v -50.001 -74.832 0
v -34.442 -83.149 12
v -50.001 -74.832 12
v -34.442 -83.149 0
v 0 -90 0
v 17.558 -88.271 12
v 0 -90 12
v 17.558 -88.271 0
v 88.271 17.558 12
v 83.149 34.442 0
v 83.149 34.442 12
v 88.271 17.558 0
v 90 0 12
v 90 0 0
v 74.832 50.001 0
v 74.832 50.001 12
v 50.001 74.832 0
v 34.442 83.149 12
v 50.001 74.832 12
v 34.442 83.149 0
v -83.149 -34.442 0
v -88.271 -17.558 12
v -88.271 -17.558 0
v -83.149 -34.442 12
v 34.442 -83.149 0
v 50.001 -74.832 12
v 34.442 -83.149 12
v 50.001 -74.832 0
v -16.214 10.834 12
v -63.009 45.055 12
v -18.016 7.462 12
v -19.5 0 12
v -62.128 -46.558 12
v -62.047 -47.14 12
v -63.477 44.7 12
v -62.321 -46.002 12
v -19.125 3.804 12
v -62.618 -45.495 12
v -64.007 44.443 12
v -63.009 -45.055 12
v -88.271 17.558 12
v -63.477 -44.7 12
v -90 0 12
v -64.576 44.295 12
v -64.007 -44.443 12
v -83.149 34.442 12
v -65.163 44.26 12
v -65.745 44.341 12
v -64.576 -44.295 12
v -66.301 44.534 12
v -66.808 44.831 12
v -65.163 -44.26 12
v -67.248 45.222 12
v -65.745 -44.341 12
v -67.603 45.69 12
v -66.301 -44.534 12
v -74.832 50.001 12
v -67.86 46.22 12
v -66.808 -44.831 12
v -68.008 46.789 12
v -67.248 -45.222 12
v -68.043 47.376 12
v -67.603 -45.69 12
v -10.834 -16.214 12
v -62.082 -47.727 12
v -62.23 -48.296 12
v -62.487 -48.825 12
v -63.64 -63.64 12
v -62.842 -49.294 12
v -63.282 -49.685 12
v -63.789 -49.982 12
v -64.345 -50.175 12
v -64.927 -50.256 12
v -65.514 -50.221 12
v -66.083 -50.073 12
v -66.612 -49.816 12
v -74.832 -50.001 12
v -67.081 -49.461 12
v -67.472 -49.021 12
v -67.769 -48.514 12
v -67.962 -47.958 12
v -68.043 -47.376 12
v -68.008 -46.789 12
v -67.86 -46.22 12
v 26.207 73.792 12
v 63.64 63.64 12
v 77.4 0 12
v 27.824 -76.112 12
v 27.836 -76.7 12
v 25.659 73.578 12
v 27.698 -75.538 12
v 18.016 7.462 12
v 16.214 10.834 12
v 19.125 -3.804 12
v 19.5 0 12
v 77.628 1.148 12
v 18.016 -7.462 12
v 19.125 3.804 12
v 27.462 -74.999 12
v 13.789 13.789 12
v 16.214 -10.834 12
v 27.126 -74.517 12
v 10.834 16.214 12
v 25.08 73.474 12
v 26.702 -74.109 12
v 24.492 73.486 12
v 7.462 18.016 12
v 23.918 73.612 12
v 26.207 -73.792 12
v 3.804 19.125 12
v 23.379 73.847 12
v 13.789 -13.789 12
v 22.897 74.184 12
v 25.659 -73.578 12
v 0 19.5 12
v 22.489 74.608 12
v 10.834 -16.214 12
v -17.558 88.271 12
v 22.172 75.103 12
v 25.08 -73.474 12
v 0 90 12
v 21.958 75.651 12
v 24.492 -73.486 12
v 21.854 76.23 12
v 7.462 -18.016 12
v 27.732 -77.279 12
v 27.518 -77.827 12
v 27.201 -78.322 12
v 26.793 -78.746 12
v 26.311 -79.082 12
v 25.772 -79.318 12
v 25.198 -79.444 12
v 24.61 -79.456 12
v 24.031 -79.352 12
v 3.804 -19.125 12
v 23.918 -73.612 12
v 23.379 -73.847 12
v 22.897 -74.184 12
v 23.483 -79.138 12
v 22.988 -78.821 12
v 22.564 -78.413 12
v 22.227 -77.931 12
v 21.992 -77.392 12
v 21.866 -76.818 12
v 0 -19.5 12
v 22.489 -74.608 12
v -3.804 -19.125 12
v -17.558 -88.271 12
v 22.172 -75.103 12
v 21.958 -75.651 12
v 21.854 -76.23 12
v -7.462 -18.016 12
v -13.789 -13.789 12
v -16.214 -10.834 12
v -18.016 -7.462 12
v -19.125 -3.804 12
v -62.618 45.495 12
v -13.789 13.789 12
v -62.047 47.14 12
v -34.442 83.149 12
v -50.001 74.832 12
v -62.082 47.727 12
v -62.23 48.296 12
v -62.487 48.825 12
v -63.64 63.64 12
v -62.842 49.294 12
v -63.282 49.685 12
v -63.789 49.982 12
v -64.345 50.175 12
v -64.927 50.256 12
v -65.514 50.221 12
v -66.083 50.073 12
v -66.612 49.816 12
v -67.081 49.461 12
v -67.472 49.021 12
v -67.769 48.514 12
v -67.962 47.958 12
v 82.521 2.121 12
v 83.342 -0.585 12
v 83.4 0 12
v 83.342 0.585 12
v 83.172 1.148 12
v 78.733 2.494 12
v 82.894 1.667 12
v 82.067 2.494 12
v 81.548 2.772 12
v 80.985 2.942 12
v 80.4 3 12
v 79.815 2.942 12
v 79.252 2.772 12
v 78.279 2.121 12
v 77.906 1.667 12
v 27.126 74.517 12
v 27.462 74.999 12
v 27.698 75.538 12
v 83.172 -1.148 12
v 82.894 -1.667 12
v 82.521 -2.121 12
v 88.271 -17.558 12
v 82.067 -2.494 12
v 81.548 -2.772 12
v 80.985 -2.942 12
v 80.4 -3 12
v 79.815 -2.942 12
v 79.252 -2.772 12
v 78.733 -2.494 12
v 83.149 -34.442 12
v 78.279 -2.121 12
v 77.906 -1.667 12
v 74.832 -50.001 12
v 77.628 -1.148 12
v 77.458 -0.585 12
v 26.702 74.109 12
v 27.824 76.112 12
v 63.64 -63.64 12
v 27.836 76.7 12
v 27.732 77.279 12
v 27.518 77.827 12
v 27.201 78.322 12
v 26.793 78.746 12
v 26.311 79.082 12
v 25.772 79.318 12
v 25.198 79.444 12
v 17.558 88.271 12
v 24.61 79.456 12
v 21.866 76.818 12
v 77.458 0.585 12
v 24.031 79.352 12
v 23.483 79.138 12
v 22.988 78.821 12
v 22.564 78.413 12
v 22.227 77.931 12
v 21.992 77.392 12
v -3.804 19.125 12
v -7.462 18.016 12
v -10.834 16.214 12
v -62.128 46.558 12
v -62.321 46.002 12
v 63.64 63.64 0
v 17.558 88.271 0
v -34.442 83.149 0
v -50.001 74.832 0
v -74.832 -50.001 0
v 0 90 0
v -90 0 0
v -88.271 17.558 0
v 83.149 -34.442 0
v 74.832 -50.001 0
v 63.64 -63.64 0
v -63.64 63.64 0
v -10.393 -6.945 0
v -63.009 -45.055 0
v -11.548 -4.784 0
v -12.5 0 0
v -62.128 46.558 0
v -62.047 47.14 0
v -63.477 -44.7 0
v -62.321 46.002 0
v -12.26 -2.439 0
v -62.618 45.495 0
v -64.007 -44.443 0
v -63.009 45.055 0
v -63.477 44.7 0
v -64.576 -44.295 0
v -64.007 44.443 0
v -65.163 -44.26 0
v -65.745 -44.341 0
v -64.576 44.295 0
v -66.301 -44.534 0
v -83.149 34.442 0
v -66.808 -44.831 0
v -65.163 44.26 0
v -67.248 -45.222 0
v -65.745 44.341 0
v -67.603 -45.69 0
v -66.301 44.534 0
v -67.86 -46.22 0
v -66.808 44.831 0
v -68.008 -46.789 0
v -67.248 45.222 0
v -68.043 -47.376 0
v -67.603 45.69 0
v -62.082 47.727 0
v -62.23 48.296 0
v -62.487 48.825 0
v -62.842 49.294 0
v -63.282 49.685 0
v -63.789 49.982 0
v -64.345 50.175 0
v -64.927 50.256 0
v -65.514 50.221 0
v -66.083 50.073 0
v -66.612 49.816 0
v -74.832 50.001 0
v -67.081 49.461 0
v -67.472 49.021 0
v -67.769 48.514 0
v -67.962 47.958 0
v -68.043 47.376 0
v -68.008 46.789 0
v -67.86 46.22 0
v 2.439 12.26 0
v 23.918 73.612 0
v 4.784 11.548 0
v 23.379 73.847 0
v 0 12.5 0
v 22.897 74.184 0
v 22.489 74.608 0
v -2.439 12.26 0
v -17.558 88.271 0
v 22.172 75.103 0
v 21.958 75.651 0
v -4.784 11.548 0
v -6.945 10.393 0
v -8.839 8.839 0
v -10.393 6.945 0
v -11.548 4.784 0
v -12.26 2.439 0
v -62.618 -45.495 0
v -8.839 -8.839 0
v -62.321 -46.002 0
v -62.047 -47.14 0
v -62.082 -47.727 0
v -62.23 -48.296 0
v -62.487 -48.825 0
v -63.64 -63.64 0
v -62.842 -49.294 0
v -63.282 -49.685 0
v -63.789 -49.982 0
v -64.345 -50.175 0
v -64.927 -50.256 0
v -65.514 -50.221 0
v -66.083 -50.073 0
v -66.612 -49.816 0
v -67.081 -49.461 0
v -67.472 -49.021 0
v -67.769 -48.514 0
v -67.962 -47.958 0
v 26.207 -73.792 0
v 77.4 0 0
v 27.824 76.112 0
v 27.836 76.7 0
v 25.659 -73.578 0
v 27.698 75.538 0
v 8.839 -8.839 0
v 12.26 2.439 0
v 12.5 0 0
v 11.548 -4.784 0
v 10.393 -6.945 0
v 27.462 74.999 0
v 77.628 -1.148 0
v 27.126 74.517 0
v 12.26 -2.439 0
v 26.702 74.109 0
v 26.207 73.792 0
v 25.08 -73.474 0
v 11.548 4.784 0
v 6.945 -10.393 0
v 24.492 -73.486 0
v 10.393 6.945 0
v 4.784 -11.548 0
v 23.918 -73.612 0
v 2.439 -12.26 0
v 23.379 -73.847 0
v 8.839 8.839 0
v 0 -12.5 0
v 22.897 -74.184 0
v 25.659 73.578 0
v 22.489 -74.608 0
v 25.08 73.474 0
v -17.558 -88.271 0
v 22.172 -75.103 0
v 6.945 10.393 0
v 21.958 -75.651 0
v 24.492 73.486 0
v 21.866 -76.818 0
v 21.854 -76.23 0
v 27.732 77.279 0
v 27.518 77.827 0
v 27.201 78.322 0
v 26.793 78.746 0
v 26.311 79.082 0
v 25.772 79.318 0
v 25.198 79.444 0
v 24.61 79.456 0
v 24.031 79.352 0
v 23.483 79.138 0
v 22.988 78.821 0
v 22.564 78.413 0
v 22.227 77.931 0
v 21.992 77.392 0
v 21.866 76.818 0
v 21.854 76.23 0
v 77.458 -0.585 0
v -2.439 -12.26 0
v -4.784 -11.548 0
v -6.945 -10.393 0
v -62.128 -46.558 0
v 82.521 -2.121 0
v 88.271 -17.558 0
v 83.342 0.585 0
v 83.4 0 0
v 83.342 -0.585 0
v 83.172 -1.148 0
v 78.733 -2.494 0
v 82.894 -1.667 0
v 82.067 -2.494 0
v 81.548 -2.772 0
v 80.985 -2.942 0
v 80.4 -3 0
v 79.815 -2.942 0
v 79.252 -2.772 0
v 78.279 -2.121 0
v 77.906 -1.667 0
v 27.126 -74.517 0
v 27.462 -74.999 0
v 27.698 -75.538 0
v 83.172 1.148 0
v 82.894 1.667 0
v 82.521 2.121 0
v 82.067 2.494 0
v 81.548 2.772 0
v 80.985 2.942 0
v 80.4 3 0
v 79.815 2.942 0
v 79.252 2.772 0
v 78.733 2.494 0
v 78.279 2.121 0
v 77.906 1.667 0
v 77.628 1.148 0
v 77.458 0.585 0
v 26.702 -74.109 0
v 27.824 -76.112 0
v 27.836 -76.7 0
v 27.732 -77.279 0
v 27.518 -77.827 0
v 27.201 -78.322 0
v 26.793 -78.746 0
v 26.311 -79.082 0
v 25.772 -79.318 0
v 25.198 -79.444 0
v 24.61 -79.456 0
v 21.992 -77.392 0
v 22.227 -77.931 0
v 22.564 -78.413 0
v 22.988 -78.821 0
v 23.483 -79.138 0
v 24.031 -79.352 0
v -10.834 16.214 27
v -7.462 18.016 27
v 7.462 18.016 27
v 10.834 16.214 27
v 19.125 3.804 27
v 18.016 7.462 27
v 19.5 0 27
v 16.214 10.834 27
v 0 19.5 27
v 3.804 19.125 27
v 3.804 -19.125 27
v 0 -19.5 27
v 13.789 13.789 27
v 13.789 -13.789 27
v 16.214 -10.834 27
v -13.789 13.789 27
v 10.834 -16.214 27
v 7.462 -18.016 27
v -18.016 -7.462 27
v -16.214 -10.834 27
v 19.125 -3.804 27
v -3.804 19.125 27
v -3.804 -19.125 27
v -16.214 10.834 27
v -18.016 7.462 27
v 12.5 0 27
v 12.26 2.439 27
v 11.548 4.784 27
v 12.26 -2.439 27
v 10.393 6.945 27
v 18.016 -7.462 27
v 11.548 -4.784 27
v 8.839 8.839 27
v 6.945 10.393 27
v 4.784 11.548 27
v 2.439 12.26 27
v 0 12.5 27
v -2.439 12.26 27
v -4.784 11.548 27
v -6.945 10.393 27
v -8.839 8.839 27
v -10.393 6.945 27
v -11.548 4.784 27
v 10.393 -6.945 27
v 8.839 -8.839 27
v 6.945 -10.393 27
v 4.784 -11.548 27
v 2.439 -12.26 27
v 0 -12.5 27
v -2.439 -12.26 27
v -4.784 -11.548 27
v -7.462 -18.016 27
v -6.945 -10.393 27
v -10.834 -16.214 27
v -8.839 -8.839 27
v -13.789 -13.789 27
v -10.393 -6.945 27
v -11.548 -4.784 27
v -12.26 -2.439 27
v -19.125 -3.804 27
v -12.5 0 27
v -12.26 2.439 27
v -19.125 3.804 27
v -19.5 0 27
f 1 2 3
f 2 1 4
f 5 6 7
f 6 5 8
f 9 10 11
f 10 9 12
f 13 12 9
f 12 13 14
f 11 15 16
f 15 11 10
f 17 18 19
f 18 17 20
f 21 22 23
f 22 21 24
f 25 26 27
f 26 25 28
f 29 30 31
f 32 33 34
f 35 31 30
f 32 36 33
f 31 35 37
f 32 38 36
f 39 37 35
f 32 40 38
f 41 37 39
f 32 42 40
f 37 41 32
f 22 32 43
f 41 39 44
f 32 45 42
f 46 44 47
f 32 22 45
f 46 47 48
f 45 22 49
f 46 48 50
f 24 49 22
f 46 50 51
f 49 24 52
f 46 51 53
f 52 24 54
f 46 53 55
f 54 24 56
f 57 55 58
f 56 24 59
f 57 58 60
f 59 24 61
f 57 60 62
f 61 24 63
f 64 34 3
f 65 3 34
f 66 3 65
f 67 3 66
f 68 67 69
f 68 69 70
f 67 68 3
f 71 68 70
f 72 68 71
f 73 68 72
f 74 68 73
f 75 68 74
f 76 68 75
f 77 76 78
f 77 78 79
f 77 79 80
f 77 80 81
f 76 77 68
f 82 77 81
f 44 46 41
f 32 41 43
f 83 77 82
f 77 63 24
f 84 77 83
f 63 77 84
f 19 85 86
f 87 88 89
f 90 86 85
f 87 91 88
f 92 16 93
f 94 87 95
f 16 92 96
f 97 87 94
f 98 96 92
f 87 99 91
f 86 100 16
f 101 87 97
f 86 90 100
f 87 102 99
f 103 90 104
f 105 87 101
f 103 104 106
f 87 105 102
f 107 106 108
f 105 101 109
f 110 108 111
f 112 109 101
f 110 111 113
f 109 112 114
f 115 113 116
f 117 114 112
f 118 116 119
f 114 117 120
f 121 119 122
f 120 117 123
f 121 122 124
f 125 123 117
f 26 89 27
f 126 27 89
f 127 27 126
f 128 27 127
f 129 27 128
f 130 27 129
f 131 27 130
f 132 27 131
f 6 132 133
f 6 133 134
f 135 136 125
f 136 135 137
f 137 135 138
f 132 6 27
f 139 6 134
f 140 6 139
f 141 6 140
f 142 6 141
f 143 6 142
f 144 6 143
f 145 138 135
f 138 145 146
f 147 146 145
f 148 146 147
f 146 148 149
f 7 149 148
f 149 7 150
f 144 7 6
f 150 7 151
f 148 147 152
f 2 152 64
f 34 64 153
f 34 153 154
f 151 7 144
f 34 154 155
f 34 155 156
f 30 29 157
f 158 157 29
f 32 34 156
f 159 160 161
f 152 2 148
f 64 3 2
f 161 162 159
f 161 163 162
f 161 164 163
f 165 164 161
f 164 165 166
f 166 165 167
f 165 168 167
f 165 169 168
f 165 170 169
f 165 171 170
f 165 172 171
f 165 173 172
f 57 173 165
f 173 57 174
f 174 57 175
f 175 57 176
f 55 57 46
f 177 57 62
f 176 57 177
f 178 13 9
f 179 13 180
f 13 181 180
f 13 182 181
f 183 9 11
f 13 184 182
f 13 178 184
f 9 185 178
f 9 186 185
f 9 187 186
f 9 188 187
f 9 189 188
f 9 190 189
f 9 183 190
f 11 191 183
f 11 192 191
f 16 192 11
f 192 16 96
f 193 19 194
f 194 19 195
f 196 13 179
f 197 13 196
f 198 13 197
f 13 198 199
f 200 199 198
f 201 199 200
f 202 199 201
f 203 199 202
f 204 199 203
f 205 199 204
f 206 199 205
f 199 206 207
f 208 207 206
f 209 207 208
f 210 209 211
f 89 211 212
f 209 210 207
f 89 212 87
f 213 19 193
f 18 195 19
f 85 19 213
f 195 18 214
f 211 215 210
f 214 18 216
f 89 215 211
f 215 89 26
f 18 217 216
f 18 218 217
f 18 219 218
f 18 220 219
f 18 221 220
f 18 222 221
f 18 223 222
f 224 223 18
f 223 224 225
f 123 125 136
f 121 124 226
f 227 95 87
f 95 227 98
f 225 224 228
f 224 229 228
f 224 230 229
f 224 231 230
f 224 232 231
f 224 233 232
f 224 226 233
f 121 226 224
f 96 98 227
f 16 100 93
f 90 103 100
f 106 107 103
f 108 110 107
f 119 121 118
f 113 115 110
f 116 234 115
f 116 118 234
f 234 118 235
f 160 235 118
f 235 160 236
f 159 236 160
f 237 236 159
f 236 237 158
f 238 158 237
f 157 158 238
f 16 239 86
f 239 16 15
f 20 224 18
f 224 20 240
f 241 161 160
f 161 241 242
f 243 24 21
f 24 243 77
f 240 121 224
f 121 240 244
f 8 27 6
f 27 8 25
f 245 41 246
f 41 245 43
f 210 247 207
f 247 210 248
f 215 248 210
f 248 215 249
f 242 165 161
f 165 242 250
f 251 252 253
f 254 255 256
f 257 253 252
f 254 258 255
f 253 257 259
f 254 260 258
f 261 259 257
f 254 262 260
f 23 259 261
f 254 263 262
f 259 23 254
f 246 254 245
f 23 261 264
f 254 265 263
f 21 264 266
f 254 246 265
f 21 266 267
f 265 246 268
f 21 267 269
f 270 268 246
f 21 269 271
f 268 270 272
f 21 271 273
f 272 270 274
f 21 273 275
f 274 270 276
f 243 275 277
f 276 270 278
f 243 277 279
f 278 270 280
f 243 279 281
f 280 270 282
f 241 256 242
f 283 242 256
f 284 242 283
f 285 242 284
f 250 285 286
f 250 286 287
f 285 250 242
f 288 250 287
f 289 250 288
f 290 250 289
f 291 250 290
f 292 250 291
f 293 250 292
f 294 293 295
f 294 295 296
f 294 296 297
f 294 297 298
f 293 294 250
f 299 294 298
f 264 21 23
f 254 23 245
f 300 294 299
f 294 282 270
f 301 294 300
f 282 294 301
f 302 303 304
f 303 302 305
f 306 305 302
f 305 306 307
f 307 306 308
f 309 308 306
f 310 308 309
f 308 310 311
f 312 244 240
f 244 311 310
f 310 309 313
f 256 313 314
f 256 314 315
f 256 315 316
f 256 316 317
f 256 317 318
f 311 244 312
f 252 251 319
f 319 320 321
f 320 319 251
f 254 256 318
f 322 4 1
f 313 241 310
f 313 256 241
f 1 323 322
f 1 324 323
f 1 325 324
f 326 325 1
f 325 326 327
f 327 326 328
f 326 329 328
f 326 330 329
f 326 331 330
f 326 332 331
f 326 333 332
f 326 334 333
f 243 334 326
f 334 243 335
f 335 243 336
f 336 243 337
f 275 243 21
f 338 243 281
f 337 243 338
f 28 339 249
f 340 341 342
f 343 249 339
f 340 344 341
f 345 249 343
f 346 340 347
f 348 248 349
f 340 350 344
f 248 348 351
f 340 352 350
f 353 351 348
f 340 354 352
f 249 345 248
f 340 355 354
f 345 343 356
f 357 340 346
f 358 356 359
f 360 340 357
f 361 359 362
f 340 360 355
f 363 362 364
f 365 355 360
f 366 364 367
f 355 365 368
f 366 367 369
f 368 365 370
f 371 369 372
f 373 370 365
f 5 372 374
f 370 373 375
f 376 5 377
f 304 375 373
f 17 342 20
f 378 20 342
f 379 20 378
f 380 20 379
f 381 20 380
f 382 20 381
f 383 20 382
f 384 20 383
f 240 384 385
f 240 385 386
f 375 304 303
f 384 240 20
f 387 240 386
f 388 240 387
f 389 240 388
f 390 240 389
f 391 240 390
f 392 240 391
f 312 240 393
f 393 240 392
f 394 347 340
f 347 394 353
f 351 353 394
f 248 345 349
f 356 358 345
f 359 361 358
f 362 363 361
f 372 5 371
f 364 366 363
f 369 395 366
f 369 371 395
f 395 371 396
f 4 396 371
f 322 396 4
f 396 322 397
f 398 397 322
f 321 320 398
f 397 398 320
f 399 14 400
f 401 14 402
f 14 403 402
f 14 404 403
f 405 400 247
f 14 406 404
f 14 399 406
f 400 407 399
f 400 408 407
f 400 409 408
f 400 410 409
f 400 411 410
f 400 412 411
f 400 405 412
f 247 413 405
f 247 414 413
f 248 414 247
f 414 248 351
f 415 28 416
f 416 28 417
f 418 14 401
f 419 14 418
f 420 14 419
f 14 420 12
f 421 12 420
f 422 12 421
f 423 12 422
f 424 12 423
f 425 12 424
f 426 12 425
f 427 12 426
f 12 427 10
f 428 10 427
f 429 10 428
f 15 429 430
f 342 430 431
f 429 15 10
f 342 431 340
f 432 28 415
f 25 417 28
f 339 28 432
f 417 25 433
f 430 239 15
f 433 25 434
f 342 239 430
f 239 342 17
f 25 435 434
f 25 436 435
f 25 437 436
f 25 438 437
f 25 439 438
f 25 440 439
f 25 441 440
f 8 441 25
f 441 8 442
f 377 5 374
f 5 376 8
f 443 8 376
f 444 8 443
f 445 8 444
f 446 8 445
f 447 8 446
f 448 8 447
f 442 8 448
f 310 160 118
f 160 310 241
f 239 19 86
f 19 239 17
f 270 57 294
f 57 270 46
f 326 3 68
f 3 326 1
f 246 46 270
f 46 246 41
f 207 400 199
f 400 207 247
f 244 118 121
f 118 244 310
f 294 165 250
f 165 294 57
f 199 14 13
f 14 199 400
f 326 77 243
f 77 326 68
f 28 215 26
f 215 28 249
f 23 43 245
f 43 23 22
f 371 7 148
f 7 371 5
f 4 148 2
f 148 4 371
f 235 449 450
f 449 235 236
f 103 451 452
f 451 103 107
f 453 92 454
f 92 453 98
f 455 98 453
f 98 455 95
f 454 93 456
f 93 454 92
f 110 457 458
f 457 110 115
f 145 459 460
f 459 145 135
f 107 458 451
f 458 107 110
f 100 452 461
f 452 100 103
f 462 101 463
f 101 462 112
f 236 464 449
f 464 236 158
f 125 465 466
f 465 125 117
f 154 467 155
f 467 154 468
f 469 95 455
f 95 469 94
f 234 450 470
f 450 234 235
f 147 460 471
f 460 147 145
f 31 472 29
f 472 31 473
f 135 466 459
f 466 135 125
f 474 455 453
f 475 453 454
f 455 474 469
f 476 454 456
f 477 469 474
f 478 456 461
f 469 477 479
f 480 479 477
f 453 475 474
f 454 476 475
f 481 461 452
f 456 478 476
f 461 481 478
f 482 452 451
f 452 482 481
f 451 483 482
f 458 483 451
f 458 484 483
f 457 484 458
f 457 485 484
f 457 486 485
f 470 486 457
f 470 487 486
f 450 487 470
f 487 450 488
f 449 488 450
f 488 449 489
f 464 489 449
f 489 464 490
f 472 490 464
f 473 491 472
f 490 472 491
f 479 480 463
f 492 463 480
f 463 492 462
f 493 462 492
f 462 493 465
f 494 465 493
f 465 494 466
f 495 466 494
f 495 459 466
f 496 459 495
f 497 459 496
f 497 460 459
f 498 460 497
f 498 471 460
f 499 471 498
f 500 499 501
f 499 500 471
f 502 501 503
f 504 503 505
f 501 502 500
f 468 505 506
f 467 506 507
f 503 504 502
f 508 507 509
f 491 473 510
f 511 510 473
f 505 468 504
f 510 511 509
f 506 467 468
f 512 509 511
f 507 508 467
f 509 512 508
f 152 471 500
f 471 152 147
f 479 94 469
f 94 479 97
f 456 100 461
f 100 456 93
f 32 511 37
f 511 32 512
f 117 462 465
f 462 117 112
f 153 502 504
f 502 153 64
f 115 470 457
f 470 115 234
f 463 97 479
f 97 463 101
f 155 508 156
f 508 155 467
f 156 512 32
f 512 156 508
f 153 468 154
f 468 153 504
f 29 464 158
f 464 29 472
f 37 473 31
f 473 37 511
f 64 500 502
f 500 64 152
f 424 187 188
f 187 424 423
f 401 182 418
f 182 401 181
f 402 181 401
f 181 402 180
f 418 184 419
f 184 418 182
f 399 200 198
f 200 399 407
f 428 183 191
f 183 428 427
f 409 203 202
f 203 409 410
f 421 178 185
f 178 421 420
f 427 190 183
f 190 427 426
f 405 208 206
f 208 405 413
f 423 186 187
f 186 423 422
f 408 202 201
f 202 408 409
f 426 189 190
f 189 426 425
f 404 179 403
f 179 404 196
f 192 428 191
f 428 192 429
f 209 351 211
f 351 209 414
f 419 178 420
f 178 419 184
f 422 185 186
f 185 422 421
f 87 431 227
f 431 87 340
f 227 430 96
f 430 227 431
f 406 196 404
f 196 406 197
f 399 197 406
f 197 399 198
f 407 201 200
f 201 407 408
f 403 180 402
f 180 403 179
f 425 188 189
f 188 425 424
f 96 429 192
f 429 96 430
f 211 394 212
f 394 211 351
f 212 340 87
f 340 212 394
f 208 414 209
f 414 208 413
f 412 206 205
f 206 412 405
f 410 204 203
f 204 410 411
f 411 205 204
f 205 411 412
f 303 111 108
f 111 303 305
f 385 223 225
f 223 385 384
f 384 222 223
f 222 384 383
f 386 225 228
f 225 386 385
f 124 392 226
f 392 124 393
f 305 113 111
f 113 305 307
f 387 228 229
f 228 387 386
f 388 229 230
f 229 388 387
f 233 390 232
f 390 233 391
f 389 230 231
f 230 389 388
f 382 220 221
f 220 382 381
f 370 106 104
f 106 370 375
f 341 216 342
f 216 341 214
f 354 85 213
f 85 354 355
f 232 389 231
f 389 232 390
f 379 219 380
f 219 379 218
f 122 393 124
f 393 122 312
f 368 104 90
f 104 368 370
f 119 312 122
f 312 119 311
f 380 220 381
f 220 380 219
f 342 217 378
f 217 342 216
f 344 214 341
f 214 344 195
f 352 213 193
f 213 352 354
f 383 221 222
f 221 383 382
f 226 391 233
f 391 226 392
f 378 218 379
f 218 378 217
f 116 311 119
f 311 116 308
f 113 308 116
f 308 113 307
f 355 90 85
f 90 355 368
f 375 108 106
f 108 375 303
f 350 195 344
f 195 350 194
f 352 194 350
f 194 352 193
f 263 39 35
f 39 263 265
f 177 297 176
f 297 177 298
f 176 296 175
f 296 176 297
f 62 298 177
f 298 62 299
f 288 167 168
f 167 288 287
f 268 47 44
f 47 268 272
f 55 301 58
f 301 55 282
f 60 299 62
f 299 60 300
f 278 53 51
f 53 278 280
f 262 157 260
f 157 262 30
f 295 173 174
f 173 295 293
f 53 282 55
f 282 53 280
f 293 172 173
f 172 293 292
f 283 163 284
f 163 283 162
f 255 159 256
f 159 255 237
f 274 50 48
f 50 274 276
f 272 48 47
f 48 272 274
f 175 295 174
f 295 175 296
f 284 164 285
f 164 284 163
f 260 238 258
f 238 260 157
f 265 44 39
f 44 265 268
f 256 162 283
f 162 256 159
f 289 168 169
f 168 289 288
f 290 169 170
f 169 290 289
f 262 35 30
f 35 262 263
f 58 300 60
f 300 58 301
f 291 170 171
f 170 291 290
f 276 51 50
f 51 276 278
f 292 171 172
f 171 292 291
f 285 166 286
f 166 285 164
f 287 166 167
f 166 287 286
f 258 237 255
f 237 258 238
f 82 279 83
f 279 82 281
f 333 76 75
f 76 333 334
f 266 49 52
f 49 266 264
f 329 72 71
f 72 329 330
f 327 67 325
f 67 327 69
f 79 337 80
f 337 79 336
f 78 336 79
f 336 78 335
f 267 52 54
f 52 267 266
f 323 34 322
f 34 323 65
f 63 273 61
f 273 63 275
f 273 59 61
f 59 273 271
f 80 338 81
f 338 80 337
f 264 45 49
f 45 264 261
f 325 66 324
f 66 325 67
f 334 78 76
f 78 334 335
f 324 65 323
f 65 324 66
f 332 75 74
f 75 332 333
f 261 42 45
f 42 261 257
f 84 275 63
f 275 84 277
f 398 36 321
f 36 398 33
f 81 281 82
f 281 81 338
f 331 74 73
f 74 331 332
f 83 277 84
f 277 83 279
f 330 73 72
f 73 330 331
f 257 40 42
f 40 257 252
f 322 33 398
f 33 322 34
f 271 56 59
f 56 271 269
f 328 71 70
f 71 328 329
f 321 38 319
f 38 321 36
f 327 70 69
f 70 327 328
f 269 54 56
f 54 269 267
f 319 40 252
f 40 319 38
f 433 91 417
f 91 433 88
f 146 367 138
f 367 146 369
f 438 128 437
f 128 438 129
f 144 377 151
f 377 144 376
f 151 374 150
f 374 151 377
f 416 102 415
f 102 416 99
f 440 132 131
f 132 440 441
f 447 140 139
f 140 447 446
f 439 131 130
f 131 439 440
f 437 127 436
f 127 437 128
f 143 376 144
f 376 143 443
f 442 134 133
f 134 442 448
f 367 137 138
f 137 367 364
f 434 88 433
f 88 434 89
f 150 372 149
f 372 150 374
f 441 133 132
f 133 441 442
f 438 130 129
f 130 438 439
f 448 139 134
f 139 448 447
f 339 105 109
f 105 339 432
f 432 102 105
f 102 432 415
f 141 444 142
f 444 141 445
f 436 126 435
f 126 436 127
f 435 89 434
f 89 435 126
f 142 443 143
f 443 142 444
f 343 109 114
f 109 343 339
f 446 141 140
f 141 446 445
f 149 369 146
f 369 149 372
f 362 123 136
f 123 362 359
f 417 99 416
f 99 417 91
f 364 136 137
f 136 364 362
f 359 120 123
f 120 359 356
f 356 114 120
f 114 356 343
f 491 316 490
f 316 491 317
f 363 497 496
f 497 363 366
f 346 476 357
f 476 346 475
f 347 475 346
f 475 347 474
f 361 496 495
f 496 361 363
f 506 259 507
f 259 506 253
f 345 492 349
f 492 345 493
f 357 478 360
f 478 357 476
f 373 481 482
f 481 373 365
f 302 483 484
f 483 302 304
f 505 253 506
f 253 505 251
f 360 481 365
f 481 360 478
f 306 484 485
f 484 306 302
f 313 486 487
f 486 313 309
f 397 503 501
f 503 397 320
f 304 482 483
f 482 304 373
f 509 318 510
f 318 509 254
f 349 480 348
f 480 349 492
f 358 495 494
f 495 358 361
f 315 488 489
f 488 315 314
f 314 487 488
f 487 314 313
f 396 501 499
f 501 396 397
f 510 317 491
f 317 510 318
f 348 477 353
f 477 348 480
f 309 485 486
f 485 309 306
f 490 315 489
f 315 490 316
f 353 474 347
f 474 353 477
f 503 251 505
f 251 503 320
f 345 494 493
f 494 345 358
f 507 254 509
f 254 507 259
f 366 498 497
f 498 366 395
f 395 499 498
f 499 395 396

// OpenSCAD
$fn = 32;

// ----------------------------------------------------------------------
// Bolt-circle flange: 180 mm outside, 5 bolt holes, bore 25 mm
// ----------------------------------------------------------------------

// --- parameters (mm) ---
flange_d = 180;           // flange outside diameter
flange_t = 12;            // flange thickness
bolts = 5;                // number of bolt holes
bolt_d = 6;               // bolt clearance
bolt_r = 80.4;            // bolt circle radius
bore_d = 25;              // centre bore
hub_d = 39;               // raised hub diameter
hub_h = 15;               // raised hub height

module body() {
  cylinder(h = flange_t, d = flange_d);
  /* raised hub, sunk 1 mm into the flange */
  translate([0, 0, flange_t - 1]) cylinder(h = hub_h + 1, d = hub_d);
}

difference() {
  body();
  /* bolt circle */
  for (i = [0 : bolts - 1]) rotate([0, 0, i * 360 / bolts]) translate([bolt_r, 0, -1]) cylinder(h = flange_t + hub_h + 3, d = bolt_d);
  translate([0, 0, -1]) cylinder(h = flange_t + hub_h + 3, d = bore_d);
}
